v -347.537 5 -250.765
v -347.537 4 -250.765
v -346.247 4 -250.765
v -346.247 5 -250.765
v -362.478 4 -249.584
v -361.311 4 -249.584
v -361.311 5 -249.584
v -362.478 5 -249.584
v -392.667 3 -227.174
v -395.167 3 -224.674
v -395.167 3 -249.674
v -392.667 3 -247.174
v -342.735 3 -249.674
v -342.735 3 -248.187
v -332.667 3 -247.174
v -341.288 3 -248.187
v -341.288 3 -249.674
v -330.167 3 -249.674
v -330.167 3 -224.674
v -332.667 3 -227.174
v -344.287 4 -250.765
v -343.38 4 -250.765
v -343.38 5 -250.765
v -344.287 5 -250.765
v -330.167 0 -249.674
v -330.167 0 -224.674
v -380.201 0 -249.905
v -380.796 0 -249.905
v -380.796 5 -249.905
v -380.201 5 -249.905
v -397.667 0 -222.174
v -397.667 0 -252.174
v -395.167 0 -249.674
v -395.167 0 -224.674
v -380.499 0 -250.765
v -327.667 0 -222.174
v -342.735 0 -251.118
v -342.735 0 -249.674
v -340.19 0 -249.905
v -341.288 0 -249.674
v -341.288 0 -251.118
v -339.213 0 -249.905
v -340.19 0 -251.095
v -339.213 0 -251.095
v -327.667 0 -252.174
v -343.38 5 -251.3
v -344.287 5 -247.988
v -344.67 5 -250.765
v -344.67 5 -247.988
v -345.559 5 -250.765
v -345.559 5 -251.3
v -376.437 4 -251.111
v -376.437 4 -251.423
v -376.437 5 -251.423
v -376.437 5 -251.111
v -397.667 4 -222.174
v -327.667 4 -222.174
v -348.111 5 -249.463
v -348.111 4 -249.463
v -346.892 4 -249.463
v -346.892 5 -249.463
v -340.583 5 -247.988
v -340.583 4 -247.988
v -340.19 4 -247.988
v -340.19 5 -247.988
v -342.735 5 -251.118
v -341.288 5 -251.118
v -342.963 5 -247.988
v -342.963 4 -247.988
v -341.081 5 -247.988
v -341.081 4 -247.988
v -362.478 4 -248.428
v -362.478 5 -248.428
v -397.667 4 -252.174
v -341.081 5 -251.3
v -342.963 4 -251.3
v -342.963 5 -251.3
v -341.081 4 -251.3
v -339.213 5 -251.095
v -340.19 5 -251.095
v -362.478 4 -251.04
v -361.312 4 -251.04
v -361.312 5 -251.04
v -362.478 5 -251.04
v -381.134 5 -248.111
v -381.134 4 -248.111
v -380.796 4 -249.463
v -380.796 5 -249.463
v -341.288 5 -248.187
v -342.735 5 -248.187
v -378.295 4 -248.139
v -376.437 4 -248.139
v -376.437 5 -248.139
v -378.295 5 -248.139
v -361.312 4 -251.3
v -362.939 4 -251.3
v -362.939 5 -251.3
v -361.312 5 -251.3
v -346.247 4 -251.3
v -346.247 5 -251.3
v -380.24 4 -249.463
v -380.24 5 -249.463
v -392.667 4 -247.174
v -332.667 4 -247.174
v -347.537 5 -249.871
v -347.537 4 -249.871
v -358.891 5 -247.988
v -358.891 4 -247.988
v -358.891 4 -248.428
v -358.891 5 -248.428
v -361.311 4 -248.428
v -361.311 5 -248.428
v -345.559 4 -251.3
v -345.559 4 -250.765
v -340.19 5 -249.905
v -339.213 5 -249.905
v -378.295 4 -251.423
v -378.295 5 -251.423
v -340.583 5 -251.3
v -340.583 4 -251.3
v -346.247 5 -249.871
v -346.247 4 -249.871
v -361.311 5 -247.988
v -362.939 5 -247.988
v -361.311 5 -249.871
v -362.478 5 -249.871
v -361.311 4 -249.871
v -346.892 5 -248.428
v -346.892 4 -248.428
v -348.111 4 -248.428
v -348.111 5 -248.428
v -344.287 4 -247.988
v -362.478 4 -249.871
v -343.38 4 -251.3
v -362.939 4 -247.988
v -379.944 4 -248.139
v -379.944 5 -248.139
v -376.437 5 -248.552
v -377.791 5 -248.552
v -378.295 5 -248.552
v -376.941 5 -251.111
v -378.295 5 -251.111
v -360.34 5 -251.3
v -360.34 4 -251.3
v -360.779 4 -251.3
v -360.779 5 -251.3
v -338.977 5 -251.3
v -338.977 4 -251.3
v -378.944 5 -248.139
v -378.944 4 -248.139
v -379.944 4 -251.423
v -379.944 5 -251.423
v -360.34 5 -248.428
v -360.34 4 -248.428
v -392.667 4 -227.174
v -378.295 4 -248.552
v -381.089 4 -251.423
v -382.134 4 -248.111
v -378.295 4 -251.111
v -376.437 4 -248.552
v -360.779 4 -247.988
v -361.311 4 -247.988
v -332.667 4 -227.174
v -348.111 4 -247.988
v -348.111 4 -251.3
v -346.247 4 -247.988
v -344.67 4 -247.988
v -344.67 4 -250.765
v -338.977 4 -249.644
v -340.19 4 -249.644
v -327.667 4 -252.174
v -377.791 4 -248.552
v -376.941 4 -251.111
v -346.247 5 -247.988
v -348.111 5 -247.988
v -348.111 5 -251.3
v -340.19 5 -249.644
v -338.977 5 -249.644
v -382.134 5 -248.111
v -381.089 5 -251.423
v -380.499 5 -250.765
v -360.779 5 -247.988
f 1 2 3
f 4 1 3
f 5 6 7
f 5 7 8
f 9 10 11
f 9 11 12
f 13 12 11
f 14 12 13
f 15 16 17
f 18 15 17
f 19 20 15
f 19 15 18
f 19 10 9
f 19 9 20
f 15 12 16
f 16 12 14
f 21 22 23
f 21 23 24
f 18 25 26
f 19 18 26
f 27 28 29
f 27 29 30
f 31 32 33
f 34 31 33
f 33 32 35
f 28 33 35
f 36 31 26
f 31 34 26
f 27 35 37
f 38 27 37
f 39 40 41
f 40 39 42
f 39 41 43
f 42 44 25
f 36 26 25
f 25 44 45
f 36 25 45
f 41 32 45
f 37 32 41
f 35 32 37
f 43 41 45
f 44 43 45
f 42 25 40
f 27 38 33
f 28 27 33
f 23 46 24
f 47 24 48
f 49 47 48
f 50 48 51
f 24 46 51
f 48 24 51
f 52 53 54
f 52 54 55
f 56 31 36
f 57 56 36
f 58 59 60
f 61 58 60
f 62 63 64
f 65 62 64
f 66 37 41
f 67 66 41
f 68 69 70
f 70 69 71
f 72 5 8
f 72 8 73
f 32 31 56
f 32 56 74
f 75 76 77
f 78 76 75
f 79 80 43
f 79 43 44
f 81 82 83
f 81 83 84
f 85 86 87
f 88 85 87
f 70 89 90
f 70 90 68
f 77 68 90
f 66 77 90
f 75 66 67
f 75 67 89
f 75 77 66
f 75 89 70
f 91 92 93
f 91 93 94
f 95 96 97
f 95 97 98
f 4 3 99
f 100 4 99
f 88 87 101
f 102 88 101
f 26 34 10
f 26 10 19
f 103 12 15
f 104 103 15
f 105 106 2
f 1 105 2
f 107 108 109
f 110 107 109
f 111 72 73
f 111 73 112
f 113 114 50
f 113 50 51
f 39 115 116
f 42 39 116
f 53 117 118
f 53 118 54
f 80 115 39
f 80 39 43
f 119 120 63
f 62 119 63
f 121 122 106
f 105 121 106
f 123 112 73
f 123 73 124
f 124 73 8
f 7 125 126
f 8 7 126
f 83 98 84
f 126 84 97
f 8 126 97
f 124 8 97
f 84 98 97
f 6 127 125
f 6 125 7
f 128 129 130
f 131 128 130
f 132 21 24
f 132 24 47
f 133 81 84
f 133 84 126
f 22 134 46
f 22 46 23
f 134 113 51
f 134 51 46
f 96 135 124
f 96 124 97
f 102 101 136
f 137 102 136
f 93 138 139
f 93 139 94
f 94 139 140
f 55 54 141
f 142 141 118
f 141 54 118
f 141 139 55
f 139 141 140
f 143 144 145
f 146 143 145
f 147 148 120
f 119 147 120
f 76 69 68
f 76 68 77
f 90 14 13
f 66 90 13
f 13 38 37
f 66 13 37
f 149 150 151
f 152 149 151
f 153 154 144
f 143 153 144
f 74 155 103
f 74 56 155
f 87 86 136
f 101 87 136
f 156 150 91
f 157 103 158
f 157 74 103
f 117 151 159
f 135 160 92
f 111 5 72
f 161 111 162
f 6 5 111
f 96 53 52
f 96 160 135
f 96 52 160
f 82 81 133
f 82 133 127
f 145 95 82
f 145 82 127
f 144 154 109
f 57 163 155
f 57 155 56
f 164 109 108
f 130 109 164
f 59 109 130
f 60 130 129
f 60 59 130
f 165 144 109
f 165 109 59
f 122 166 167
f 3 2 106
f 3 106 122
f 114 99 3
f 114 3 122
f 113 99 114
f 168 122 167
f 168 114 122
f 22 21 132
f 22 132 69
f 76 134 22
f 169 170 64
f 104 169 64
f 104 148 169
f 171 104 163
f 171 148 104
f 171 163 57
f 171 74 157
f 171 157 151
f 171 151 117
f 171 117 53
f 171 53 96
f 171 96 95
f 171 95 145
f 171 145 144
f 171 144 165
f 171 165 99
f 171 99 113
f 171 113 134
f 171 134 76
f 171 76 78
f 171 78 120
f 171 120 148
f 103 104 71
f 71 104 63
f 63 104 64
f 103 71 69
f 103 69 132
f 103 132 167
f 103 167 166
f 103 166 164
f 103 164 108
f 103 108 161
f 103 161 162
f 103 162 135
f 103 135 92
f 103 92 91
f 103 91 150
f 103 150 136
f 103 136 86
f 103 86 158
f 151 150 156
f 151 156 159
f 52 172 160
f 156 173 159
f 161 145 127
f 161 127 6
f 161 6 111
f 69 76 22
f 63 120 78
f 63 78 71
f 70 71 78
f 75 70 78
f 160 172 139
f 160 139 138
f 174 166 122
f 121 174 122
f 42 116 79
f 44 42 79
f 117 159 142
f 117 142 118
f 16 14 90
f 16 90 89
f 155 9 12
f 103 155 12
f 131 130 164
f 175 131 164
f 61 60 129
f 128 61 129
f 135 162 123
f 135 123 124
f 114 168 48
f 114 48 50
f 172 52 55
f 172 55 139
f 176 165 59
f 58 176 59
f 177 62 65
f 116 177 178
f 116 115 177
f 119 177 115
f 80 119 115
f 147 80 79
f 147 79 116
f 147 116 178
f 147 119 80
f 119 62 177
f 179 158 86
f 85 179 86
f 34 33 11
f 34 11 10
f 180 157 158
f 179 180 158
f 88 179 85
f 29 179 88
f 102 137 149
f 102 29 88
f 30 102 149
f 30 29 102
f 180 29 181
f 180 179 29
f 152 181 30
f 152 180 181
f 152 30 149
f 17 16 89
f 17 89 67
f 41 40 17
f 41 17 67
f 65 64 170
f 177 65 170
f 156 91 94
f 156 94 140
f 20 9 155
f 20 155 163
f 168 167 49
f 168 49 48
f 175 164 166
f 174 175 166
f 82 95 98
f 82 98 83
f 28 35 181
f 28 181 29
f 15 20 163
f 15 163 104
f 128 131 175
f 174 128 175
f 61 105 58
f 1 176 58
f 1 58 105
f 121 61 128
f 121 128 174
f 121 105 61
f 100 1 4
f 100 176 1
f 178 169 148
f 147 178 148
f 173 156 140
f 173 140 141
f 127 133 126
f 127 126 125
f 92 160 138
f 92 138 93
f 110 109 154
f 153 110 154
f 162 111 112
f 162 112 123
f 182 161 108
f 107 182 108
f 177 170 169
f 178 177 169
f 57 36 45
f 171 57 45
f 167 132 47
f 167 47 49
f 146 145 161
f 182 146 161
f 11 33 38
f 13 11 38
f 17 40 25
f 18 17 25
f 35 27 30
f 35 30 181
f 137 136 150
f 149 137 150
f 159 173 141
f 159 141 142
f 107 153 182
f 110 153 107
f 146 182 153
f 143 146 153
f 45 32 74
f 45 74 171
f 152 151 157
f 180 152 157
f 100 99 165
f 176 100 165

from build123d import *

# Parameters (mm, degrees)
SALIENTE_EXTRUIR1_DEPTH   = 5
SALIENTE_EXTRUIR1_2_DEPTH = 5
SALIENTE_EXTRUIR1_3_DEPTH = 5
SALIENTE_EXTRUIR1_4_DEPTH = 5
SALIENTE_EXTRUIR1_5_DEPTH = 5
SALIENTE_EXTRUIR1_6_DEPTH = 5
CROQUIS1_W                = 1.882038395
CROQUIS1_H                = 3.311920174
CROQUIS1_W_2              = 1.44614363
CROQUIS1_H_2              = 2.931372224
SALIENTE_EXTRUIR1_7_DEPTH = 5
CROQUIS1_W_3              = 0.976947733
CROQUIS1_H_3              = 1.190080085
SALIENTE_EXTRUIR1_8_DEPTH = 5
CROQUIS1_3_W              = 70
CROQUIS1_3_H              = 30
CROQUIS1_3_W_2            = 60
CROQUIS1_3_H_2            = 20
CROQUIS1_3_W_3            = 1.882038395
CROQUIS1_3_H_3            = 3.311920174
SALIENTE_EXTRUIR2_DEPTH   = 4
CROQUIS3_W                = 65
CROQUIS3_H                = 25
CORTAR_EXTRUIR1_DEPTH     = 3


with BuildPart() as part:
    # Croquis1 → Saliente-Extruir1 (new body)
    with BuildSketch(Plane(origin=(0, 0, 0), x_dir=(1, 0, 0), z_dir=(0, 1, 0))):
        Polygon((-381.088562756, 251.423394178), (-382.133986502, 248.111474004), (-381.133986502, 248.111474004), (-380.795875473, 249.462867756), (-380.240129471, 249.462867756), (-379.943592304, 248.138701402), (-378.943592304, 248.138701402), (-379.943592304, 251.423394178), align=None)
        Polygon((-380.2013533, 249.904754056), (-380.795875473, 249.904754056), (-380.498614386, 250.764925918), align=None, mode=Mode.SUBTRACT)
    extrude(amount=SALIENTE_EXTRUIR1_DEPTH)



with BuildPart() as body_2:
    # Croquis1 → Saliente-Extruir1 2 (new body)
    with BuildSketch(Plane(origin=(0, 0, 0), x_dir=(1, 0, 0), z_dir=(0, 1, 0))):
        Polygon((-376.436891972, 251.423394178), (-378.294984375, 251.423394178), (-378.294984375, 251.111377613), (-376.940948953, 251.111377613), (-378.294984375, 248.551558823), (-378.294984375, 248.138701402), (-376.436891972, 248.138701402), (-376.436891972, 248.551558823), (-377.790927393, 248.551558823), (-376.436891972, 251.111377613), align=None)
    extrude(amount=SALIENTE_EXTRUIR1_2_DEPTH)


with BuildPart() as body_3:
    # Croquis1 → Saliente-Extruir1 3 (new body)
    with BuildSketch(Plane(origin=(0, 0, 0), x_dir=(1, 0, 0), z_dir=(0, 1, 0))):
        Polygon((-361.312091548, 251.300316154), (-362.939380698, 251.300316154), (-362.939380698, 247.98839598), (-361.310931064, 247.98839598), (-361.310931064, 248.428480798), (-362.478498726, 248.428480798), (-362.478498726, 249.584160603), (-361.310931064, 249.584160603), (-361.310931064, 249.871397066), (-362.478498726, 249.871397066), (-362.478498726, 251.039680014), (-361.312091548, 251.039680014), align=None)
    extrude(amount=SALIENTE_EXTRUIR1_3_DEPTH)


with BuildPart() as body_4:
    # Croquis1 → Saliente-Extruir1 4 (new body)
    with BuildSketch(Plane(origin=(0, 0, 0), x_dir=(1, 0, 0), z_dir=(0, 1, 0))):
        Polygon((-360.339718911, 251.300316154), (-360.779331555, 251.300316154), (-360.779331555, 247.98839598), (-358.890625378, 247.98839598), (-358.890625378, 248.428480798), (-360.339718911, 248.428480798), align=None)
    extrude(amount=SALIENTE_EXTRUIR1_4_DEPTH)


with BuildPart() as body_5:
    # Croquis1 → Saliente-Extruir1 5 (new body)
    with BuildSketch(Plane(origin=(0, 0, 0), x_dir=(1, 0, 0), z_dir=(0, 1, 0))):
        Polygon((-346.246917904, 251.300316154), (-348.110575355, 251.300316154), (-348.110575355, 249.462867756), (-346.892030098, 249.462867756), (-346.892030098, 248.428480798), (-348.110575355, 248.428480798), (-348.110575355, 247.98839598), (-346.246917904, 247.98839598), (-346.246917904, 249.871397066), (-347.537142293, 249.871397066), (-347.537142293, 250.764925918), (-346.246917904, 250.764925918), align=None)
    extrude(amount=SALIENTE_EXTRUIR1_5_DEPTH)


with BuildPart() as body_6:
    # Croquis1 → Saliente-Extruir1 6 (new body)
    with BuildSketch(Plane(origin=(0, 0, 0), x_dir=(1, 0, 0), z_dir=(0, 1, 0))):
        Polygon((-343.379752594, 251.300316154), (-345.558798229, 251.300316154), (-345.558798229, 250.764925918), (-344.670110195, 250.764925918), (-344.670110195, 247.98839598), (-344.28749707, 247.98839598), (-344.28749707, 250.764925918), (-343.379752594, 250.764925918), align=None)
    extrude(amount=SALIENTE_EXTRUIR1_6_DEPTH)


with BuildPart() as body_7:
    # Croquis1 → Saliente-Extruir1 7 (new body)
    with BuildSketch(Plane(origin=(0, 0, 0), x_dir=(1, 0, 0), z_dir=(0, 1, 0))):
        with Locations((-342.02217467, 249.644356067)):
            Rectangle(CROQUIS1_W, CROQUIS1_H)
        with Locations((-342.011459779, 249.652215762)):
            Rectangle(CROQUIS1_W_2, CROQUIS1_H_2, mode=Mode.SUBTRACT)
    extrude(amount=SALIENTE_EXTRUIR1_7_DEPTH)


with BuildPart() as body_8:
    # Croquis1 → Saliente-Extruir1 8 (new body)
    with BuildSketch(Plane(origin=(0, 0, 0), x_dir=(1, 0, 0), z_dir=(0, 1, 0))):
        Polygon((-338.977474459, 251.300316154), (-340.583262112, 251.300316154), (-340.583262112, 247.98839598), (-340.190237162, 247.98839598), (-340.190237162, 249.644356067), (-338.977474459, 249.644356067), align=None)
        with Locations((-339.701763296, 250.499794098)):
            Rectangle(CROQUIS1_W_3, CROQUIS1_H_3, mode=Mode.SUBTRACT)
    extrude(amount=SALIENTE_EXTRUIR1_8_DEPTH)


with BuildPart() as part_1:
    add(part.part)

    add(body_2.part)  # Saliente-Extruir2 merges body 2

    add(body_3.part)  # Saliente-Extruir2 merges body 3

    add(body_4.part)  # Saliente-Extruir2 merges body 4

    add(body_5.part)  # Saliente-Extruir2 merges body 5

    add(body_6.part)  # Saliente-Extruir2 merges body 6

    add(body_7.part)  # Saliente-Extruir2 merges body 7

    add(body_8.part)  # Saliente-Extruir2 merges body 8
    # Croquis1<3> → Saliente-Extruir2 (add)
    with BuildSketch(Plane(origin=(0, 0, 0), x_dir=(1, 0, 0), z_dir=(0, 1, 0))):
        with Locations((-362.667441108, 237.173755489)):
            Rectangle(CROQUIS1_3_W, CROQUIS1_3_H)
        Polygon((-381.133986502, 248.111474004), (-382.133986502, 248.111474004), (-381.088562756, 251.423394178), (-379.943592304, 251.423394178), (-378.943592304, 248.138701402), (-379.943592304, 248.138701402), (-380.240129471, 249.462867756), (-380.795875473, 249.462867756), align=None, mode=Mode.SUBTRACT)
        Polygon((-378.294984375, 251.111377613), (-378.294984375, 251.423394178), (-376.436891972, 251.423394178), (-376.436891972, 251.111377613), (-377.790927393, 248.551558823), (-376.436891972, 248.551558823), (-376.436891972, 248.138701402), (-378.294984375, 248.138701402), (-378.294984375, 248.551558823), (-376.940948953, 251.111377613), align=None, mode=Mode.SUBTRACT)
        with Locations((-362.667441108, 237.173755489)):
            Rectangle(CROQUIS1_3_W_2, CROQUIS1_3_H_2, mode=Mode.SUBTRACT)
        Polygon((-362.939380698, 247.98839598), (-362.939380698, 251.300316154), (-361.312091548, 251.300316154), (-361.312091548, 251.039680014), (-362.478498726, 251.039680014), (-362.478498726, 249.871397066), (-361.310931064, 249.871397066), (-361.310931064, 249.584160603), (-362.478498726, 249.584160603), (-362.478498726, 248.428480798), (-361.310931064, 248.428480798), (-361.310931064, 247.98839598), align=None, mode=Mode.SUBTRACT)
        Polygon((-360.779331555, 247.98839598), (-360.779331555, 251.300316154), (-360.339718911, 251.300316154), (-360.339718911, 248.428480798), (-358.890625378, 248.428480798), (-358.890625378, 247.98839598), align=None, mode=Mode.SUBTRACT)
        Polygon((-348.110575355, 249.462867756), (-348.110575355, 251.300316154), (-346.246917904, 251.300316154), (-346.246917904, 250.764925918), (-347.537142293, 250.764925918), (-347.537142293, 249.871397066), (-346.246917904, 249.871397066), (-346.246917904, 249.462867756), (-346.246917904, 247.98839598), (-348.110575355, 247.98839598), (-348.110575355, 248.428480798), (-346.892030098, 248.428480798), (-346.892030098, 249.462867756), align=None, mode=Mode.SUBTRACT)
        Polygon((-345.558798229, 250.764925918), (-345.558798229, 251.300316154), (-343.379752594, 251.300316154), (-343.379752594, 250.764925918), (-344.28749707, 250.764925918), (-344.28749707, 247.98839598), (-344.670110195, 247.98839598), (-344.670110195, 250.764925918), align=None, mode=Mode.SUBTRACT)
        with Locations((-342.02217467, 249.644356067)):
            Rectangle(CROQUIS1_3_W_3, CROQUIS1_3_H_3, mode=Mode.SUBTRACT)
        Polygon((-340.583262112, 247.98839598), (-340.583262112, 251.300316154), (-338.977474459, 251.300316154), (-338.977474459, 249.644356067), (-340.190237162, 249.644356067), (-340.190237162, 247.98839598), align=None, mode=Mode.SUBTRACT)
    extrude(amount=SALIENTE_EXTRUIR2_DEPTH)

    # Croquis3 → Cortar-Extruir1 (cut)
    with BuildSketch(Plane.XZ):
        with Locations((-362.667441108, -237.173755489)):
            Rectangle(CROQUIS3_W, CROQUIS3_H)
    extrude(amount=-CORTAR_EXTRUIR1_DEPTH, mode=Mode.SUBTRACT)


solid = part_1.part
